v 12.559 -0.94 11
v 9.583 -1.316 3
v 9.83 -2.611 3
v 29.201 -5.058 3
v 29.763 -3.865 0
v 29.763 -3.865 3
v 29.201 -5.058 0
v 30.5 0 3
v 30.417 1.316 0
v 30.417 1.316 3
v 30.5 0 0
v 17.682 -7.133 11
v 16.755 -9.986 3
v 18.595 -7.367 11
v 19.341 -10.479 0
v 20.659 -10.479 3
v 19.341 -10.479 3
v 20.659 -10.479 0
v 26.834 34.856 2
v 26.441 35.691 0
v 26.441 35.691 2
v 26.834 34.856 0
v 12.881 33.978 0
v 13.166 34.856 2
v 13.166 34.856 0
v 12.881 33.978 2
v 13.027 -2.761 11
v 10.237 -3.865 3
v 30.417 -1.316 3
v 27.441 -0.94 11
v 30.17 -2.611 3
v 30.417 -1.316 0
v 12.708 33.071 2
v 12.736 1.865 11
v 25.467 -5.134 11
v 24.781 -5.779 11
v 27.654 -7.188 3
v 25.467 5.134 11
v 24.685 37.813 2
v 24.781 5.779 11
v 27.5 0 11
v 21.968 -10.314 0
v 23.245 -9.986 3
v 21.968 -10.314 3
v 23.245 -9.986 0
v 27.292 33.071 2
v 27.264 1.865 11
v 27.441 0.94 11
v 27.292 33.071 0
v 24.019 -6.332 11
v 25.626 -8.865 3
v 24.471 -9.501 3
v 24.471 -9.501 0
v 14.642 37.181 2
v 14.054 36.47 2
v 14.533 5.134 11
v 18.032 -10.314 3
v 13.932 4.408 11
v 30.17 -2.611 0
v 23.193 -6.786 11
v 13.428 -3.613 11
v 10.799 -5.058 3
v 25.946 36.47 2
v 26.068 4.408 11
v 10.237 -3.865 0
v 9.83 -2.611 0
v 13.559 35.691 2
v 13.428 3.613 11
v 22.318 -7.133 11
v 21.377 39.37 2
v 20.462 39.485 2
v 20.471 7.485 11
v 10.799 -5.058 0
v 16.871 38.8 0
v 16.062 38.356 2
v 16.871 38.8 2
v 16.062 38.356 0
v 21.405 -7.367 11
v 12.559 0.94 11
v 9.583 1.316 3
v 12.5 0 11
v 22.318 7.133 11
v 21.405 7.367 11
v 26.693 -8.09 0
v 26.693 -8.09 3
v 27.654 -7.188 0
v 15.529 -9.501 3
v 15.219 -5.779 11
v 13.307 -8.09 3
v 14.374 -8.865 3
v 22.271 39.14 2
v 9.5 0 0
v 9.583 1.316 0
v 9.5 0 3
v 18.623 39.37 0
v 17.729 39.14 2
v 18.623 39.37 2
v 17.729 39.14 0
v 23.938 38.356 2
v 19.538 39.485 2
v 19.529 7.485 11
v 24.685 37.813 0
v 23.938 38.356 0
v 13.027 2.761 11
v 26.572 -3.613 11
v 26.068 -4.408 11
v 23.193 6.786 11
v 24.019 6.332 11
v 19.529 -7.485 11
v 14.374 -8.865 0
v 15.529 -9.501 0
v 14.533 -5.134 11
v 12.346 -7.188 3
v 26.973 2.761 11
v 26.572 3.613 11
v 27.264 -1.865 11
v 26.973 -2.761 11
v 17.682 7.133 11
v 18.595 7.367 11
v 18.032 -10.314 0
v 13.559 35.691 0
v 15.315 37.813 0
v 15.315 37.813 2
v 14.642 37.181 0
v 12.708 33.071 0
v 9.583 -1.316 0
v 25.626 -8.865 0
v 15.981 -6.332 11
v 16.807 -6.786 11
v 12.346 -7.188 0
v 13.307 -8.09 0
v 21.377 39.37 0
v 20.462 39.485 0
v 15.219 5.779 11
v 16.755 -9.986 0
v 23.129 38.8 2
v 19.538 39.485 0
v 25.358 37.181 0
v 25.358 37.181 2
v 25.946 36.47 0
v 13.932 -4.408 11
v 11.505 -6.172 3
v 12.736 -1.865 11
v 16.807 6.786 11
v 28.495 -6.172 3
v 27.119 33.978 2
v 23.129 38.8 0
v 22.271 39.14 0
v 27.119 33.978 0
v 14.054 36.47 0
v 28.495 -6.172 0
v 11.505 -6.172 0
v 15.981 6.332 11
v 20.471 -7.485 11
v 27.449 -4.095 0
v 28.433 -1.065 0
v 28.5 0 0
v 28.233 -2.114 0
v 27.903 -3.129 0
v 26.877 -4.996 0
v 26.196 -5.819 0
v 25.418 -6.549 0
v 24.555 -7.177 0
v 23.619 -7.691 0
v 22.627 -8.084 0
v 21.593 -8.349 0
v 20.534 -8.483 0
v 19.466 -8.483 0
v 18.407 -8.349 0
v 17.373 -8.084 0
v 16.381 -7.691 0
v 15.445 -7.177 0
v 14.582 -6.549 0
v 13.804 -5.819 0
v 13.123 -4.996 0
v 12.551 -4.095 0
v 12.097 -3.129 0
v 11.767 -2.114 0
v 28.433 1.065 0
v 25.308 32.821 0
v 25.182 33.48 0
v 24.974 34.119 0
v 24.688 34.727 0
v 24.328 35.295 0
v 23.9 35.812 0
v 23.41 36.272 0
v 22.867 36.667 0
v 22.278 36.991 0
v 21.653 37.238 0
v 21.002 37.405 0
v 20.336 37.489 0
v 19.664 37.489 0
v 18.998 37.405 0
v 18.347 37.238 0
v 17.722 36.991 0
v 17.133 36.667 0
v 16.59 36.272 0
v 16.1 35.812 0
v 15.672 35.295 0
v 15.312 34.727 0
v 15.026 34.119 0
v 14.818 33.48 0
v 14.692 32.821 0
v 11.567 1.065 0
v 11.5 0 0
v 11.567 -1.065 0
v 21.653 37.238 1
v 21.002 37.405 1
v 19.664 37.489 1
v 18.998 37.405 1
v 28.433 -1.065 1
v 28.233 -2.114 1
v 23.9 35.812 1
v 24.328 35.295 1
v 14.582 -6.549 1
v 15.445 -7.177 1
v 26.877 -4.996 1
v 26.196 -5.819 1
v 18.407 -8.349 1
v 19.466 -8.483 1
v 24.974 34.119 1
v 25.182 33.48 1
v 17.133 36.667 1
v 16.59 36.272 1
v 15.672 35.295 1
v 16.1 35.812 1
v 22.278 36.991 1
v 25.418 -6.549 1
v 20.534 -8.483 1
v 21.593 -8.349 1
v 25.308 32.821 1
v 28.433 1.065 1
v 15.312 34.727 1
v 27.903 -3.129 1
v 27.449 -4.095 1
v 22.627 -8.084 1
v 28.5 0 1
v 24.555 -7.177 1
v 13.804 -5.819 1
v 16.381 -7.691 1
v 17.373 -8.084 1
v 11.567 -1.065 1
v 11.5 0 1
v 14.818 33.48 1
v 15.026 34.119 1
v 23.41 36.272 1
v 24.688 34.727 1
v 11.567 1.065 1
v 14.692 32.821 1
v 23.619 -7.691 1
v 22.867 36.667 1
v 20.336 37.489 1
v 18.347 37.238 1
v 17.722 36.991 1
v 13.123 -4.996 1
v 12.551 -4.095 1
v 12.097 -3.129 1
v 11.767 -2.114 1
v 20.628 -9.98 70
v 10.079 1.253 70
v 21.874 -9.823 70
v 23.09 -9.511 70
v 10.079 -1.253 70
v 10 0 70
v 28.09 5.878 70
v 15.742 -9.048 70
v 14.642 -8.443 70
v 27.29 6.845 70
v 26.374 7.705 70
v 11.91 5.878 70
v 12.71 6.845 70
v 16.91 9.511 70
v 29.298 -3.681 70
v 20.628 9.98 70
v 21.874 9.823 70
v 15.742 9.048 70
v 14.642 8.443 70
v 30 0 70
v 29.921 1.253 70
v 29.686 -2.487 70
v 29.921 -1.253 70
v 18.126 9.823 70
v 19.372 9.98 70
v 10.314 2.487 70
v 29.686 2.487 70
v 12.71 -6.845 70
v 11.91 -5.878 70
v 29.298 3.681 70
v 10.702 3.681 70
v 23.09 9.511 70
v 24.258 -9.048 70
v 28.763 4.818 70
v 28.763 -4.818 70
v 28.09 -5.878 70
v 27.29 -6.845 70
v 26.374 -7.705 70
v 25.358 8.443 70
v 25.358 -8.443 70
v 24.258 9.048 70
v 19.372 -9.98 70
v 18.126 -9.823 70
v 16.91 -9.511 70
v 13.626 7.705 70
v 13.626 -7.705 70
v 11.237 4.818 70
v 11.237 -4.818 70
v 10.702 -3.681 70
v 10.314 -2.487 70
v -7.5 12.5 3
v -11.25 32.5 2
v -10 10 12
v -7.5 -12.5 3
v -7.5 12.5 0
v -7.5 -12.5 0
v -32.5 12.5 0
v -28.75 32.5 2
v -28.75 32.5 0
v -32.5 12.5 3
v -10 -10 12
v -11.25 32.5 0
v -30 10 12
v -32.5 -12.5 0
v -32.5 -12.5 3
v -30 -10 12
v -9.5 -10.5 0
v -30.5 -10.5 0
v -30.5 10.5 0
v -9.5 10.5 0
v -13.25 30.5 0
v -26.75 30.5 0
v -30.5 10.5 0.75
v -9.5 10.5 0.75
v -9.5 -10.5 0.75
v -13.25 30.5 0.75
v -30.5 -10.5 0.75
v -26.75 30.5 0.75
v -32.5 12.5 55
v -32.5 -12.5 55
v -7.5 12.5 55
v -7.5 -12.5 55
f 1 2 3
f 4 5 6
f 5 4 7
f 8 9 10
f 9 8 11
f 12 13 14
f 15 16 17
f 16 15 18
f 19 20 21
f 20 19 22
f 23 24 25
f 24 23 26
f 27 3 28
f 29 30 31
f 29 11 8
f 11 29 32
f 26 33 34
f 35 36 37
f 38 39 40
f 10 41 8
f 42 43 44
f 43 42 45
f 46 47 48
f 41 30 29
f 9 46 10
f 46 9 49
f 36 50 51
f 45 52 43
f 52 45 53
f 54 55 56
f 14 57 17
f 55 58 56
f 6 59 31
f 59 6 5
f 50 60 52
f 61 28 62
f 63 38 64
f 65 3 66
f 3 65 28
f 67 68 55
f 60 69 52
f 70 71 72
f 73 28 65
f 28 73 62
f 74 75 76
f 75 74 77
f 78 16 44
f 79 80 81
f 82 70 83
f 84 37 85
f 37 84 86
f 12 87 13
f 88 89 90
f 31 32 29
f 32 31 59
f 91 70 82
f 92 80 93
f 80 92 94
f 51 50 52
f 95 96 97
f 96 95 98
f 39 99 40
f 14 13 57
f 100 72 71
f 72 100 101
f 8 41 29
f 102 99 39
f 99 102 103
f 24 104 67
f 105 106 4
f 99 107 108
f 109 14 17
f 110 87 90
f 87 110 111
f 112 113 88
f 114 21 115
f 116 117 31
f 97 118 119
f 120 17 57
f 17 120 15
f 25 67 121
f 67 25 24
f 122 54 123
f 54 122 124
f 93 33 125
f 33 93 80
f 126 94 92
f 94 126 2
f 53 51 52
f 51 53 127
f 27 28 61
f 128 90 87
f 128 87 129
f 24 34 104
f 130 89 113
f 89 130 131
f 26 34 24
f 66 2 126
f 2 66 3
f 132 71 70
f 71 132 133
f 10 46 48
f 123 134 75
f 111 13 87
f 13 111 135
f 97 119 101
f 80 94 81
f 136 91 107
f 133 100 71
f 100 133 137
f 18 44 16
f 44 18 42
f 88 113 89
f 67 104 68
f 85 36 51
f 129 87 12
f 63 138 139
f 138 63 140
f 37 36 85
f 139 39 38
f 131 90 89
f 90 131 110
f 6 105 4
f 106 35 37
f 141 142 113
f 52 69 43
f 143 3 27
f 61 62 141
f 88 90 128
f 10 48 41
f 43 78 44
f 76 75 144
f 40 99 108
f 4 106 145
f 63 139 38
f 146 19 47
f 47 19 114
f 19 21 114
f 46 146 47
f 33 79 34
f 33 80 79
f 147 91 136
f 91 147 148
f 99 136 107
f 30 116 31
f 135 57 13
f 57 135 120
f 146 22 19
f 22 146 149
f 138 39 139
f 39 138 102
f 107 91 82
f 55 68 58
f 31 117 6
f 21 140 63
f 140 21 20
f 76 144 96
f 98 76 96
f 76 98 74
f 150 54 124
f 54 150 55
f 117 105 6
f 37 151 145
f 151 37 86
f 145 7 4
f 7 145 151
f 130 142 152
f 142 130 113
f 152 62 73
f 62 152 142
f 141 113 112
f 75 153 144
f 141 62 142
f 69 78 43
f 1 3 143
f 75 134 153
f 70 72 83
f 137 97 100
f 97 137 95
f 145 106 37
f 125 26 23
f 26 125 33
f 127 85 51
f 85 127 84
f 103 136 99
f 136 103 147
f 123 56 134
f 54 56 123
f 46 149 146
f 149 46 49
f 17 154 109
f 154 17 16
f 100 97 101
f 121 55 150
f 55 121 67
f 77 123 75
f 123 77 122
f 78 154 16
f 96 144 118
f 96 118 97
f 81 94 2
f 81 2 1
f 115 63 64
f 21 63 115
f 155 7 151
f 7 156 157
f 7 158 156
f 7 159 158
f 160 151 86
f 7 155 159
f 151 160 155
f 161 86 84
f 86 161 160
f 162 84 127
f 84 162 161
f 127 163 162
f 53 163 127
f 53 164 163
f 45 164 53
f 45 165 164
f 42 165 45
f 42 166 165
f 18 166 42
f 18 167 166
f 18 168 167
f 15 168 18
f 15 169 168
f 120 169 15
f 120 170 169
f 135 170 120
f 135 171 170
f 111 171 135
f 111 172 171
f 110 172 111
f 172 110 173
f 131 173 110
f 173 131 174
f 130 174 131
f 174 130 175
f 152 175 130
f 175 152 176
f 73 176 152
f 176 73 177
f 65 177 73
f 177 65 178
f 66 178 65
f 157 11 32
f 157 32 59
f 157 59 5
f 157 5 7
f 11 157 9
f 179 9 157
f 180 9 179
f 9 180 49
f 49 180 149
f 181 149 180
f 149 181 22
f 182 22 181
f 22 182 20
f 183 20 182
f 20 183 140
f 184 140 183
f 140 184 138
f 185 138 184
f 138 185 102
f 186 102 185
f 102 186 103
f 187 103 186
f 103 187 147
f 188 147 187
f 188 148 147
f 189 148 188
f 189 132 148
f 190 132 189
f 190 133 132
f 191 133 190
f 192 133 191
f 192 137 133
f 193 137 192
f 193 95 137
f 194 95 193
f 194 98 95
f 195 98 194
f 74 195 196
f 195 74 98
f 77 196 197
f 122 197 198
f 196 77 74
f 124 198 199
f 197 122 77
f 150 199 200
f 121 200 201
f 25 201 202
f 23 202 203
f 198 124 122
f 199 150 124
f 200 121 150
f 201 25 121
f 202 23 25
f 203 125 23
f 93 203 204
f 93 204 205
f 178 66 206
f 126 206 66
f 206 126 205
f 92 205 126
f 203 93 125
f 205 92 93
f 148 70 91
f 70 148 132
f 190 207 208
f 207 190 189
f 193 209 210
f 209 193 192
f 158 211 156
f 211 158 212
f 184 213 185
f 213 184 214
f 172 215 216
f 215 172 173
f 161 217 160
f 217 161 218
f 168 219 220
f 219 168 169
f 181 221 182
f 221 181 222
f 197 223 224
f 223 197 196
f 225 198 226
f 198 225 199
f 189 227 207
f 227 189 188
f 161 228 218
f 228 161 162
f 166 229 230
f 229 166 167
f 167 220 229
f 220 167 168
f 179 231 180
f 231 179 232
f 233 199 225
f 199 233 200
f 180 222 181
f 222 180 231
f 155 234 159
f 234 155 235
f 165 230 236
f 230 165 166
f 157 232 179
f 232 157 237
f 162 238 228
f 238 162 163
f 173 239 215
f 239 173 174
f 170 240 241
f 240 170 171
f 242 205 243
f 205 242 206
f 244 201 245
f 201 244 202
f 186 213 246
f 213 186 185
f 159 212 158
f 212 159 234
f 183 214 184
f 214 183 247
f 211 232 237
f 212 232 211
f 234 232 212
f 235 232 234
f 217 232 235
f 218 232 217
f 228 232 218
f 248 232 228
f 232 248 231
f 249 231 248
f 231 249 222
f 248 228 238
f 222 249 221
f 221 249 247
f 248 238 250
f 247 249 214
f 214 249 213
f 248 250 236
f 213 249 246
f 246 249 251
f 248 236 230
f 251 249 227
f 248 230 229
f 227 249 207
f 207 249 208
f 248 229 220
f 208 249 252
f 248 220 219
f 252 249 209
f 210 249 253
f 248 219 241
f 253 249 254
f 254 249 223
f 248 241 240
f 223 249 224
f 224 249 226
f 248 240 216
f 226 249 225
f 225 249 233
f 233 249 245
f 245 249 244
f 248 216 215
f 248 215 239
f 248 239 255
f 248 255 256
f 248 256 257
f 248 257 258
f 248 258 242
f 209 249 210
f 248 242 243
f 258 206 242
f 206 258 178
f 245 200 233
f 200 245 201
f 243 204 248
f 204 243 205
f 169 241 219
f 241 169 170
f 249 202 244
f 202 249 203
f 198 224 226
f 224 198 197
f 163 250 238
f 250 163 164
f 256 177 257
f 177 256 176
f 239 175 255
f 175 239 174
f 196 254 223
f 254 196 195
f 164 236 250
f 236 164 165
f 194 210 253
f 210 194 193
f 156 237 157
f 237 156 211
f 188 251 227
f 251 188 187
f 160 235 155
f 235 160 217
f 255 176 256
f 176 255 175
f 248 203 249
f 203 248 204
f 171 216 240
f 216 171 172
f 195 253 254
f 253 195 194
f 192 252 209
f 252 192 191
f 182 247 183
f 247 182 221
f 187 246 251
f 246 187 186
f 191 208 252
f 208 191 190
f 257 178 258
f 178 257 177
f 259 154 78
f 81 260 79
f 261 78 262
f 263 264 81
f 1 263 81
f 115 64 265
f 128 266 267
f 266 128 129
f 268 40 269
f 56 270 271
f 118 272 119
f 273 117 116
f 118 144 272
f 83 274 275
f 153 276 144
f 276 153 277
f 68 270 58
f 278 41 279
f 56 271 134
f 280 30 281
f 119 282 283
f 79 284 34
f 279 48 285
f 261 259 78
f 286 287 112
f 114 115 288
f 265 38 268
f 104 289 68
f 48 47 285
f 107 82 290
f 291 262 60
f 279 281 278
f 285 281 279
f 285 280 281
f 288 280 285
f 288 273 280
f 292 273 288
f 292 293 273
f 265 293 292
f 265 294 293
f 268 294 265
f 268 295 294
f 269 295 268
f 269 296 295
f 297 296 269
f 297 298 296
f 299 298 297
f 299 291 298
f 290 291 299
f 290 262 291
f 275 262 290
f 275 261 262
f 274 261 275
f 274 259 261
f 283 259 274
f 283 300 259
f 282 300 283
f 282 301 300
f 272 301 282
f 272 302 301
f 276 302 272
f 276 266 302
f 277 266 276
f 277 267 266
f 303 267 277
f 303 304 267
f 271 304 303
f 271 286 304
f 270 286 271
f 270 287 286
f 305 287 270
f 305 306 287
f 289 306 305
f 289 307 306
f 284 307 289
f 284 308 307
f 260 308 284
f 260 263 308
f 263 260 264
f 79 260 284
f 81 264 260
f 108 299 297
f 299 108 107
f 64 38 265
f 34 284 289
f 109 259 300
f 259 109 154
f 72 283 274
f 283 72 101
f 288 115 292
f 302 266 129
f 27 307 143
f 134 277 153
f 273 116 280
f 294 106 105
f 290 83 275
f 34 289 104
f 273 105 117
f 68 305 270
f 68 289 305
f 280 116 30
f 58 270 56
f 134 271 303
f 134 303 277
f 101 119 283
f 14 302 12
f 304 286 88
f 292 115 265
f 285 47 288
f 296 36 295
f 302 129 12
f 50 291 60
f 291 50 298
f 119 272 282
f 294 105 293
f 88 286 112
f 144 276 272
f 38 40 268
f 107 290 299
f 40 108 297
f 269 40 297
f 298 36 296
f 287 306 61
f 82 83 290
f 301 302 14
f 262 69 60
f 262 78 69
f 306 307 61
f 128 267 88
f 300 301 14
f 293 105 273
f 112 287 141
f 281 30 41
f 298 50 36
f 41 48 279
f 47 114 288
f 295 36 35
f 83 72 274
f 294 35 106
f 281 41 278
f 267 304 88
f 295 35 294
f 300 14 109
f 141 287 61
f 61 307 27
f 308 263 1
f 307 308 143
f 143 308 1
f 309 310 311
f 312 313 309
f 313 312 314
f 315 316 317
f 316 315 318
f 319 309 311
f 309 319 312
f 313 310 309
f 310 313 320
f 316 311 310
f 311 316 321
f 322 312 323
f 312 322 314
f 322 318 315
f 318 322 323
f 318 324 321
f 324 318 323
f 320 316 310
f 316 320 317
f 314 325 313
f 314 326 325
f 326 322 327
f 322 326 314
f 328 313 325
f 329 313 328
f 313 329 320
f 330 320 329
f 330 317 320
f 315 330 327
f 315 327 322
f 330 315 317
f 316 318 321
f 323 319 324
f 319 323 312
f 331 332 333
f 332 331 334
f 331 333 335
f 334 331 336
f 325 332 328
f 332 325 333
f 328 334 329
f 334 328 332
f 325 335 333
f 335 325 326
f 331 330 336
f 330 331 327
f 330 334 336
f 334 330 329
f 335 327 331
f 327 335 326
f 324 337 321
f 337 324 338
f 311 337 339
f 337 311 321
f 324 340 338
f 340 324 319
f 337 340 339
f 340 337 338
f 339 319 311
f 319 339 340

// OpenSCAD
// file: ../utilities/transformations_oblomobka.scad
// Transformations
// (C) @oblomobka - 2014
// GPL3

// Transforma una forma en un sector según un ángulo dado.

module sector(	angle, 	// es el ángulo del sector, lo que quedará de la forma original
				d,		// valor auxiliar, será como mínimo igual al diámetro del cilindro que envuelve la forma original
				h		// valor auxiliar, será como mínimo igual a la altura del cilindro que envuelve la forma original
				){

POINTS=[	[0,0,-h],
		[0,0,h],
		[d*cos(0*angle/4),d*sin(0*angle/4),-h],
		[d*cos(0*angle/4),d*sin(0*angle/4),h],
		[d*cos(1*angle/4),d*sin(1*angle/4),-h],
		[d*cos(1*angle/4),d*sin(1*angle/4),h],
		[d*cos(2*angle/4),d*sin(2*angle/4),-h],
		[d*cos(2*angle/4),d*sin(2*angle/4),h],
		[d*cos(3*angle/4),d*sin(3*angle/4),-h],
		[d*cos(3*angle/4),d*sin(3*angle/4),h],
		[d*cos(4*angle/4),d*sin(4*angle/4),-h],
		[d*cos(4*angle/4),d*sin(4*angle/4),h],
		];

TRIANGLES=[	[0,1,2],
			[1,3,2],
			[2,3,4],
			[3,5,4],
			[4,5,6],
			[5,7,6],
			[6,7,8],
			[7,9,8],
			[8,9,10],
			[9,11,10],
			[10,11,0],
			[11,1,0],

			[5,3,1],
			[7,5,1],
			[9,7,1],
			[11,9,1],
			[0,2,4],
			[0,4,6],
			[0,6,8],
			[0,8,10]
			];

if(angle<=0 || angle>=360){
	child();
	}
	else{
		intersection(){
			polyhedron(points=POINTS,triangles=TRIANGLES);
			child();
			}
		}
}

//sector (150,40,10)cylinder(r=20,h=10); // Ejemplo de uso de la tansformación sector()
// file: ../utilities/functions_ext.scad
// Funciones sacadas de otras librerías y de diferentes autores

include <constants_oblomobka.scad>

/* A circular helix of radius a and pitch 2πb is described by the following parametrisation:
x(t) = a*cos(t),
y(t) = a*sin(t),
z(t) = b*t
Licensed under the MIT license.
© 2010 by Elmo Mäntynen
*/
function b(pitch) = pitch/(TAU);
function t(pitch, z) = z/b(pitch);
function helix_curve(pitch, radius, z) = [radius*cos(deg(t(pitch, z))), radius*sin(deg(t(pitch, z))), z];


/* Utility functions.
 * Originally by Hans Häggström, 2010.
 * Dual licenced under Creative Commons Attribution-Share Alike 3.0 and LGPL2 or later
 */
function distance(a, b) = sqrt( (a[0] - b[0])*(a[0] - b[0]) +
                                (a[1] - b[1])*(a[1] - b[1]) +
                                (a[2] - b[2])*(a[2] - b[2]) );

function length2(a) = sqrt( a[0]*a[0] + a[1]*a[1] );

function normalized(a) = a / (max(distance([0,0,0], a), 0.00001));

function normalized_axis(a) = 	a == "x" ? [1, 0, 0]:
                  			 	a == "y" ? [0, 1, 0]:
                   				a == "z" ? [0, 0, 1]: normalized(a);

function angleOfNormalizedVector(n) = [0, -atan2(n[2], length2([n[0], n[1]])), atan2(n[1], n[0]) ];

function angle(v) = angleOfNormalizedVector(normalized(v));

function angleBetweenTwoPoints(a, b) = angle(normalized(b-a));
// file: ../utilities/constants_oblomobka.scad
// números transcendentes

TAU = 2*PI; //6.2831853071 (PI ya está definido en Openscad)
EULER=2.71828282;


// números algebraicos

PHI=(1+sqrt(5))/2;


// Vectores

X = [1, 0, 0];
Y = [0, 1, 0];
Z = [0, 0, 1];
// file: hip.scad
//////////////////////////////////////////////////////////////////////////////////////////////////
// HIP[OBLOBOTS] 
// preform
//////////////////////////////////////////////////////////////////////////////////////////////////
// (c) Jorge Medal (@oblomobka) - Sara Alvarellos (@trecedejunio) 2014-04 v.10
//////////////////////////////////////////////////////////////////////////////////////////////////
// GPL license
//////////////////////////////////////////////////////////////////////////////////////////////////

include <../utilities/external_elements_oblobots.scad>
include <../utilities/presets_oblobots.scad>
include <../utilities/limits_oblobots.scad>

use <../utilities/functions_oblomobka.scad>
use <../utilities/shapes_oblomobka.scad>


//////////////////////////////////////////////////////////////////
/////////////////// MODULO hip_cylindrical  //////////////////////

module hip_cylindrical(hip=[40,15,80]){	// [ d,h,f ] Medidas de la cadera

// valores con límites: acotados entre un máximo y un mínimo (los valores límite están en <limits_oblobots.scad>)
d_hip=lim(d_hip_minmax[0],hip[0],d_hip_minmax[1]);
h_hip=lim(h_hip_minmax[0],hip[1],h_hip_minmax[1]);
f_hip=lim(f_hip_minmax[0],hip[2],f_hip_minmax[1]);

// variables condicionadas a los valores de entrada
h1_hip=h_hip-f_hip*h_hip/110;
h2_hip=h_hip-h1_hip;

d1_hip=max(3*d_hip/4,(d_hip-2*h1_hip));  // diámetro inferior de la cadera

$fn=50;

// --------- Volumen ----------------

union(){
	cylinder(r1=d1_hip/2,r2=d_hip/2,h=h1_hip);
	translate([0,0,h1_hip])
		cylinder (r=d_hip/2,h=h2_hip);	
	}
}
// -------------- Fin del módulo hip_cylindrical() ------------------------
// ------------------------------------------------------------------------


//////////////////////////////////////////////////////////////////
/////////////////// MÓDULO hip_quadrangle()  /////////////////////

module hip_quadrangle (hip=[40,22,18,3]){			// [ ancho(x), fondo(y), altura(z), chaflán ] Medida de la cadera


x_hip=lim(x_hip_minmax[0],hip[0],x_hip_minmax[1]);			// medida de la cadera: ancho
y_hip=lim(y_hip_minmax[0],hip[1],y_hip_minmax[1]);			// medida de la cadera: fondo
z_hip=lim(z_hip_minmax[0],hip[2],z_hip_minmax[1]);			// medida de la cadera: alto
bevel_hip=lim(bevel_hip_minmax[0],hip[3],bevel_hip_minmax[1]);;		// medida de la cadera: chaflán

// Volumen
difference(){
	translate([0,0,z_hip/2])
		cube ([x_hip,y_hip,z_hip],center=true);
	for(i=[	[1,1,0],
			[1,-1,-90],
			[-1,1,90],
			[-1,-1,180]]){
		translate([i[0]*x_hip,i[1]*y_hip,0]/2)
			rotate([0,0,i[2]])rotate(45*[0,1,1])
				cube([min(2*bevel_hip,((y_hip-1)/2)),x_hip,x_hip],center=true);
		}
	}
}
// ------------ Fin del módulo hip_quadrangle(hip[x,y,z,b]) -------------
// ----------------------------------------------------------------------


/////////////////////////////////////////////////////////////////////////
/////////////////// Ejemplos de aplicación //////////////////////////////

i=35;

translate([i,0,0])
	hip_cylindrical(hip=[60,21,90]);

translate([-i,0,0])
	hip_quadrangle(hip=[50,25,25,4]);
// file: ../utilities/shapes_oblomobka.scad
// Shapes
// (C) @oblomobka - 2014
// GPL3

include <constants_oblomobka.scad>
include <functions_oblomobka.scad>
include <functions_ext.scad>

use <transformations_oblomobka.scad>

// --- Piramide con base circunscrita en un círculo definido en las variables
module pyramid_circumscribed (	n=4,			// nº lados de la base de la pirámide	
								d1=20,		// diámetro del círculo-base donde se circunscribe la pirámide
								d2=0,		// diámetro del círculo-punta donde se circunscribe la pirámide
								h=10			// altura de la pirámide
								){

if(n%2==0){
	rotate([0,0,180/n])
		cylinder (r1=d1/2/cos(180/n), r2=d2/2/cos(180/n), h=h, $fn=n);
	}
	else{
		rotate([0,0,90/n])
			cylinder (r1=d1/2/cos(180/n), r2=d2/2/cos(180/n), h=h, $fn=n);
		}

}
// ------- pyramid_circumscribed (n=n,d1=d1,d2=d2,h=h); -----------------

// --- Prisma con base circunscrita en un círculo definido en las variables
module prism_circumscribed (	n=4,			// nº lados de la base del prisma
							d=20,		// diámetro del círculo donde se circunscribe el prisma
							h=10			// altura del prisma
							){
if(n%2==0){
	rotate([0,0,180/n])
		cylinder (r=d/2/cos(180/n), h=h, $fn=n);
	}
	else{
		rotate([0,0,90/n])
			cylinder (r=d/2/cos(180/n), h=h, $fn=n);
		}
}
// ------- prism_circumscribed (n=n,d=d,h=h); -----------------



// Toros

// Definido por el diámetro exterior y el diámetro del círculo en revolución
module torusOD (d1,d2,resolution){
$fn=resolution;	
rotate_extrude(){
	translate([d1/2-d2/2,0,0])
		circle(r=d2/2);
	}
}

// Definido por el diámetro exterior y el diámetro interior
module torusOI (d1,d2,resolution){
$fn=resolution;	
d=(d1-d2)/2;
rotate_extrude(){
	translate([d1/2-d/2,0,0])
		circle(r=d/2);
	}
}

// Definido por el diámetro de la línea neutra y el diámetro del círculo en revolución
module torusND (d1,d2,resolution){
$fn=resolution;	
rotate_extrude(){
	translate([d1/2,0,0])
		circle(r=d2/2);
	}
}

module torus_sector(d1,d2,angle=360,mode=1,extreme=true,resolution=32){

if(angle<=0 || angle>=360){
	if(mode==1){torusOD(d1,d2,resolution=resolution);}
	else{if(mode==2){torusND(d1,d2,resolution=resolution);}
	else{if(mode==3){torusOI(d1,d2,resolution=resolution);}}}
	}

else{
	if(mode==1){
		union(){
			sector(angle,d1,d2/2)torusOD(d1,d2,resolution=resolution);
			if(extreme==true){
				translate([d1/2-d2/2,0,0])sphere(d2/2,$fn=resolution);
				translate([(d1/2-d2/2)*cos(angle),(d1/2-d2/2)*sin(angle),0])sphere(d2/2,$fn=resolution);
				}
			}
		}
	else{
		if(mode==2){
			union(){
				sector(angle,d1+d2,d2/2)torusND(d1,d2,resolution=resolution);
				if(extreme==true){
					translate([d1/2,0,0])sphere(d2/2,$fn=resolution);
					translate([d1/2*cos(angle),d1/2*sin(angle),0])sphere(d2/2,$fn=resolution);
					}
				}
			}
		else{
			if(mode==3){
				union(){
					sector(angle,d1,(d1-d2)/4)torusOI(d1,d2,resolution=resolution);
					if(extreme==true){
						translate([d1/2-(d1-d2)/4,0,0])sphere((d1-d2)/4,$fn=resolution);
						translate([(d1/2-(d1-d2)/4)*cos(angle),(d1/2-(d1-d2)/4)*sin(angle),0])sphere((d1-d2)/4,$fn=resolution);
						}
					}
				}
			}
		}
	}
}


// Tubos

module tubeOT (d,t,h,resolution=resolution){	
	difference(){
		cylinder(r=d/2,h=h,$fn=resolution);
		cylinder(r=(d-2*t)/2,h=3*h,center=true,$fn=resolution);
		}
}

// Definido por el diámetro exterior y el diámetro interior
module tubeOI (d1,d2,h,resolution=resolution){
	difference(){
		cylinder(r=d1/2,h=h,$fn=resolution);
		cylinder(r=d2/2,h=3*h,center=true,$fn=resolution);	
		}
}

// Definido por el diámetro de la línea neutra y el diámetro del círculo en revolución
module tubeNT (d,t,h,resolution=resolution){
	difference(){
		cylinder(r=(d+t)/2,h=h,$fn=resolution);
		cylinder(r=(d-t)/2,h=3*h,center=true,$fn=resolution);
	}
}

module tube_sector(d=25,t=2,h=1,angle=360,mode=1,extreme=true,resolution=32){

if(angle<=0 || angle>=360){
	if(mode==1){tubeOT(d,t,h,resolution=resolution);}
	else{if(mode==2){tubeNT(d,t,h,resolution=resolution);}
	else{if(mode==3){tubeOI(d,t,h,resolution=resolution);}}}
	}

else{
	if(mode==1){
		union(){
			sector(angle,d,h)tubeOT(d,t,h,resolution=resolution);
			if(extreme==true){
				translate([d/2-t/2,0,0])cylinder(r=t/2,h=h,$fn=resolution);
				translate([(d/2-t/2)*cos(angle),(d/2-t/2)*sin(angle),0])cylinder(r=t/2,h=h,$fn=resolution);;
				}
			}
		}
	else{
		if(mode==2){
			union(){
				sector(angle,d+t,h)tubeNT(d,t,h,resolution=resolution);
				if(extreme==true){
					translate([d/2,0,0])cylinder(r=t/2,h=h,$fn=resolution);
					translate([d/2*cos(angle),d/2*sin(angle),0])cylinder(r=t/2,h=h,$fn=resolution);
					}
				}
			}
		else{
			if(mode==3){
				union(){
					sector(angle,d,h)tubeOI(d,t,h,resolution=resolution);
					if(extreme==true){
						translate([d/2-(d-t)/4,0,0])cylinder(r=(d-t)/4,h=h,$fn=resolution);
						translate([(d/2-(d-t)/4)*cos(angle),(d/2-(d-t)/4)*sin(angle),0])cylinder(r=(d-t)/4,h=h,$fn=resolution);
						}
					}
				}
			}
		}
	}
}

//torus_sector(d1=15,d2=4,angle=215,mode=3,extreme=true,resolution=50);
//tube_sector(d=24,t=11,h=15,angle=250,mode=1,extreme=true,resolution=50);

pyramid_circumscribed(n=10,d=8,h=4);
// file: ../utilities/functions_oblomobka.scad
// Functions
// (C) @oblomobka - 2014
// GPL3

include <constants_oblomobka.scad>

// da el diámetro interior del cono(d1,d2,h) a una altura interior(hi) conocida
function di_cone(d1,d2,h,hi)=d2+(d1-d2)*(1-hi/h);

// da la altura interior del cono(d1,d2,h) a un diametro(di) conocido
function hi_cone(d1,d2,h,di)=-h*((di-d2)/(d1-d2)-1);

// 
function r_circle_intersection (d1,d2)=sqrt(pow(d1/2,2)-pow(d2/2,2));

// Relaciones entre radio, apotema y lado en un polígono de n lados
function side_apothem (apothem,n)=apothem*2*tan(180/n);
function apothem_radius(radius,n)=radius*cos(180/n);
function radius_apothem(apothem,n)=apothem/cos(180/n);
function side_radius (radius,n)=radius*2*sin(180/n);

// limita los posibles valores de x, que siempre estarán comprendidos entre un minimo(a) y un maximo(z)
function lim(a,x,z)=max(a,min(x,z));

// transforma angulo, radianes --> hexadecimal
function deg(angle) = 180*angle/PI;
// transforma angulo, hexadecimal --> radianes
function rad(angle) = angle*PI/180;
// file: ../utilities/limits_oblobots.scad
//PIN
	d_pin_minmax=[10,30];			//	d_pin=lim(d_pin_minmax[0],pin[0],d_pin_minmax[1]);			
	h_pin_minmax=[0,10];			//	h_pin=lim(h_pin_minmax[0],pin[1],h_pin_minmax[1]);

//LEGS & FOOTS
	d_leg_minmax=[10,30];			//	d_leg=lim(d_leg_minmax[0],leg[0],d_leg_minmax[1]);
	h_leg_minmax=[20,90];			//	h_leg=lim(h_leg_minmax[0],leg[1],h_leg_minmax[1]);	
	n_leg_minmax=[4,16];			//	n_leg=lim(n_leg_minmax[0],leg[2],n_leg_minmax[1]);
	legsposition_minmax=[0,100];	// 	legsposition=lim(legsposition_minmax[0],leg[1],legsposition_minmax[1]);

	l_foot_minmax=[24,70];		//	l_foot=lim(l_foot_minmax[0],foot[0],l_foot_minmax[1]);
	h_foot_minmax=[0,40];			//	h_foot=lim(h_foot_minmax[0],foot[1],h_foot_minmax[1]);

//HIP | WAIST
	//C
	d_hip_minmax=[25,80];			//	d_hip=lim(d_hip_minmax[0],hip[0],d_hip_minmax[1]);
	h_hip_minmax=[10,70];			//	h_hip=lim(h_pin+2,hip[1],h_hip_minmax[1]);
	f_hip_minmax=[0,100];			//	f_hip=lim(f_hip_minmax[0],hip[2],f_hip_minmax[1]);

								//	d1_waist=lim(d_pin,waist[0],d_hip);
								//	d2_waist=lim(d_pin,waist[1],d1_waist);
	h_waist_minmax=[0.3,20];		//	h_waist=lim(h_waist_minmax[0],waist[2],h_waist_minmax[1]);

	
	//Q
	x_hip_minmax=[20,90];			//	x_hip=lim(x_hip_minmax[0],hip[0],x_hip_minmax[1]);
	y_hip_minmax=[20,60];			//	y_hip=lim(y_hip_minmax[0],hip[1],y_hip_minmax[1]);
	z_hip_minmax=[10,60];			//	z_hip=lim(z_hip_minmax[0],hip[2],z_hip_minmax[1]);
	bevel_hip_minmax=[0.5,20];	//	bevel_hip=lim(bevel_hip_minmax[0],hip[3],bevel_hip_minmax[1]);

	n_waist_minmax=[4,50];		//	n_waist=lim(n_waist_minmax[0],waist[3],n_waist_minmax[1]);
								//	d1_waist=lim(d_pin,waist[0],min(x_hip,y_hip));
								//	d2_waist=lim(d_pin,waist[1],d1_waist);


//TRUNK | SHOULDER | NECK
	//C
	d1_trunk_minmax=[30,100];		//	d1_trunk=lim(d1_trunk_minmax[0],trunk[0],d1_trunk_minmax[1]); 
	d2_trunk_minmax=[30,100];		//	d2_trunk=lim(d2_trunk_minmax[0],trunk[1],d1_trunk);
	h_trunk_minmax=[24,100];		//	h_trunk=lim(h_trunk_minmax[0],trunk[2],h_trunk_minmax[1]);

	d1_shoulder_minmax=[12,50];	//	d1_shoulder=lim(d1_shoulder_minmax[0],shoulder[0],h_trunk*sin(angle_trunk));
	d_aux_shoulder_minmax=[0,10];	//	d_aux_shoulder=lim(d_aux_shoulder_minmax[0],shoulder[1],d_aux_shoulder_minmax[1]);
	h_shoulder_minmax=[0,50];		//	h_shoulder=lim(h_shoulder_minmax[0],shoulder[2],d2_trunk/2);

								//	d1_neck=lim(d_pin+2,neck[0],d2_trunk);
								//	d2_neck=lim(d_pin+2,neck[1],d1_neck);
	h_neck_minmax=[0.3,20];		//	h_neck=lim(h_neck_minmax[0],neck[2],h_neck_minmax[1]);

	//Q
	x_trunk_minmax=[20,90];		//	x_trunk=lim(x_trunk_minmax[0],trunk[0],x_trunk_minmax[1]);
	y_trunk_minmax=[20,90];		//	y_trunk=lim(d_pin+1+x_trunk/5,trunk[1],y_trunk_minmax[1]);
	z_trunk_minmax=[26,90];		//	z_trunk=lim(z_trunk_minmax[0],trunk[2],z_trunk_minmax[1]);
	
	n_neck_minmax=[4,50];			//	n_neck=lim(n_neck_minmax[0],neck[3],n_neck_minmax[1]);
								//	d1_neck=lim(d_pin+2,neck[0],min(x_trunk,y_trunk));	
								//	d2_neck=lim(d_pin+2,neck[1],d1_neck);

	//ELECTRIC TRUNK
	d_polygonal_trunk_minmax=[45,80];	//d_polygonal_trunk=lim(d_polygonal_trunk_minmax[0],trunk[0],d_polygonal_trunk_minmax[1]);							
	h_polygonal_trunk_minmax=[87,120];	//h_polygonal_trunk=lim(h_polygonal_trunk_minmax[0],trunk[1],h_polygonal_trunk_minmax[1]);
	thickness_trunk_minmax=[1,6];	//thickness_trunk=lim(thickness_trunk_minmax[0],trunk[2],thickness_trunk_minmax[1]);

// ARMS | HANDS
	// C
	d_arm_minmax=[10,40];			// 	d_arm=lim(d_arm_minmax[0],arm[0],d_arm_minmax[1]);
								//	d_arm=lim(d_pin+1,arm[0],d_arm_minmax[1]);	
	h_arm_minmax=[5,25];			// 	h_arm=lim(h_arm_minmax[0],arm[1],h_arm_minmax[1]);
	armpit_minmax=[0.3,60];		//	armpit=lim(armpit_minmax[0],arm[2],armpit_minmax[1]);
	l_arm_minmax=[20,120];		// 	l_arm=lim(d_arm+d_hand,arm[2],l_arm_minmax[1]);	

	d_hand_minmax=[10,60];		//	d_hand=lim(d_hand_minmax[0],hand[0],d_hand_minmax[1]);
	h_hand_minmax=[3,25];			//	h_hand=lim(h_hand_minmax[0],hand[1],h_arm-0.5);
	angle_hand_minmax=[0,180];	//	angle_hand=lim(angle_hand_minmax[0],hand[2]/2,angle_hand_minmax[1]);

	// Q
	x_arm_minmax=[5,25];			// 	x_arm=lim(x_arm_minmax[0],arm[1],x_arm_minmax[1]);
	y_arm_minmax=[10,40];			// 	y_arm=lim(y_arm_minmax[0],arm[0],y_arm_minmax[1]);
	z_arm_minmax=[20,120];		//	z_arm=lim(y_arm+5+d_hand,arm[2],z_arm_minmax[1]);

	n_hand_minmax=[4,12];			// 	n_hand=lim(n_hand_minmax[0],2*floor(hand[2]/2),n_hand_minmax[1]);
								//	h_hand=lim(h_hand_minmax[0],hand[1],x_arm-0.5);

// HEAD | EYES | BRAIN
	// C
	h_head_minmax=[20,100];		// 	h_head=lim(h_head_minmax[0],head[2],h_head_minmax[1]);
	d1_head_minmax=[20,60];		// 	d1_head=lim(h_head_minmax[0],head[0],h_head_minmax[1]);
	d2_head_minmax=[15,150];		// 	d2_head=lim(h_head_minmax[0],head[1],2*h_head+d1_head);

	// Q
	x_head_minmax=[20,100];		// x_head=lim(x_head_minmax[0],head[0],x_head_minmax[1]);
	y_head_minmax=[20,100];		// y_head=lim(y_head_minmax[0],head[1],y_head_minmax[1]);
	z_head_minmax=[20,100];		// z_head=lim(z_head_minmax[0],head[2],z_head_minmax[1]);

	d_eye_minmax=[5,40];			// 	d_eye=lim(d_eye_minmax[0],eye[0],(d1_head+d2_head)/2);
	h_eye_minmax=[1,10];			// 	h_eye=lim(h_eye_minmax[0],eye[1],h_eye_minmax[1]);
	edge_eye_minmax=[1,12];		//	edge_eye=lim(edge_eye_minmax[0],eye[2],d_eye/2-3);

	frown_eye_expression_minmax=[0,100];		// frown_eye_expression=lim(frown_eye_expression_minmax[0],eye_expression[1],frown_eye_expression_minmax[1]);
	bridge_eye_position_minmax=[0,100];		// bridge_eye_position=lim(bridge_eye_position_minmax[0],eye_position[0],bridge_eye_position_minmax[1]);	
	f_h_eye_position_minmax=[0,100];			// f_h_eye_position=lim(f_h_eye_position_minmax[0],eye_position[1],f_h_eye_position_minmax[1]);	

	h_brain_minmax=[0,40];			//	h_brain=lim(h_brain_minmax[0],brain[0],h_brain_minmax[1]);
	edge_brain_minmax=[0,25];			//	edge_brain=lim(edge_brain_minmax[0],brain[1],edge_brain_minmax[1]);

//BADGE
	d_badge_minmax=[20,40];		//	d_badge=lim(d_badge_minmax[0],badge[0],d_badge_minmax[1])
	h_badge_minmax=[0.5,5];		// 	h_badge=lim(h_badge_minmax[0],badge[1],h_badge_minmax[1]);
	n_badge_minmax=[4,50];		// 	n_badge=lim(n_badge_minmax[0],badge[3],n_badge_minmax[1]);
	edge_badge_minmax=[1,5];		//	edge_badge=lim(edge_badge_minmax[0],badge[2],edge_badge_minmax[1]);
// file: ../utilities/presets_oblobots.scad
//////////////////////////////////////////////////////////////////////////////////////////////////
// presets [OBLOBOTS] 
// valores predeterminados para los volúmenes de un oblobot así como de los modos de represntación
//////////////////////////////////////////////////////////////////////////////////////////////////
// (c) Jorge Medal (@oblomobka) - Sara Alvarellos (@trecedejunio) Oct 2013
//////////////////////////////////////////////////////////////////////////////////////////////////
// GPL license
//////////////////////////////////////////////////////////////////////////////////////////////////

use <functions_oblomobka.scad>


//-- CARACTERÍSTICAS DEL PIN

SIMPLE=[0,0,0];					// cilindro 

	// Pestañas en pin con punta expandible
	tab_expansion=80;
	TABWIDE=[35,35,tab_expansion];
	TABNORMAL=[50,50,tab_expansion];
	TABFINE=[65,65,tab_expansion];

/////////////////////////////////////////////
/////// REPRESENTACIÓN //////////////////////
/////////////////////////////////////////////

//-- MODOS DE REPRESENTACIÓN DE LAS PARTES 

ASSEMBLED=[0,1,0,0];
EXPLOSION=[0,1,1,1];
PRINTING=[1,0,0,2];


//-- ELECCIÓN DE LA PARTE REPRESENTADA	

ALL=[0];
LEGS=[1];
HIP=[2];
TRUNK=[3];
HEAD=[4];
ARMS=[5];
BADGES=[6];

//-- COLORES

arms_color=[1,rands(100,200,1)[0]/255,0];
legs_color=[0,rands(100,200,1)[0]/255,1];
trunk_color=[rands(0,100,1)[0]/255,rands(150,225,1)[0]/255,rands(0,100,1)[0]/255];
head_color=[220/255,rands(0,100,1)[0]/255,20/255];
badges_color=[rands(0,255,1)[0]/255,rands(0,255,1)[0]/255,rands(0,255,1)[0]/255];
hip_color=[0,(rands(100,200,1)[0])/255,1];
// file: ../utilities/external_elements_oblobots.scad
//////////////////////////////////////////////////////////////////////////////////////////////////
// external elements [OBLOBOTS] 
// librería de elementos externos comerciales (botones automáticos, espigas de madera baterías, ...) 
// que se usan en las partes de los oblobots
//////////////////////////////////////////////////////////////////////////////////////////////////
// (c) Jorge Medal (@oblomobka) - Sara Alvarellos (@trecedejunio) 2014-02
//////////////////////////////////////////////////////////////////////////////////////////////////
// GPL license
//////////////////////////////////////////////////////////////////////////////////////////////////

//-- BOTONES AUTOMÁTICOS - Press Fastener (PF)
//-- Cada código corresponde a las medidas de un modelo concreto

//XXX= [ xx,xx,xx,xx,xx,xx,xx ];		// [ 	diametro hembra,
									//		espesor hembra,
									//		diámetro alojamiento en hembra (aparece en los botones para coser),
									//		saliente del alojamiento en hembra (aparece en los botones para coser),
									//		diámetro macho,
									//		espesor macho	
									//		tipo]

NULL=[0,0,0,0,0,0,0];				// no hay botón automático 
//PON = [11.7,2.35,0,0,11.7,1.6 ];	// marca desconocida, encontrado en Pontejos (Madrid)
//PRYM10 = [11,2.2,0,0,11,2.0];		// marca PRYM - 10 mm
PRYM_SNAP_FASTENERS_11 = [10.1,1.4,3.5,3,9.1,1,2];	// marca PRYM - Snap fasteners 11mm
PRYM_SNAP_FASTENERS_9 = [8.5,1.5,3,2.7,8.1,1,2];	// marca PRYM - Snap fasteners 9mm

fit_male=0.7;

//-- Espigas de madera - DOWEL

DOWEL_8=[8,40,0,0,0,0,1];
DOWEL_6=[6,30,0,0,0,0,1];

//-- TUBOS DE PLÁSTICO

PIPE_6=[6,20,0,0,0,0,1];



//-- BATERÍAS CILÍNDRICAS

//XX= [ xx,xx ];		// [ 	diametro de la pila,
					//		longitud	de la pila	]

AA = [ 14.5, 50.5 ];
AAA = [ 10.5,44.5 ];
C = [ 26.2, 50 ];
D = [ 34.2, 61.5 ]; 
// main file
//////////////////////////////////////////////////////////////////////////////////////////////////
// Leg[OBLOBOTS] 
// preform
//////////////////////////////////////////////////////////////////////////////////////////////////
// (c) Jorge Medal (@oblomobka) - Sara Alvarellos (@trecedejunio) 2014-04 v.10
//////////////////////////////////////////////////////////////////////////////////////////////////
// GPL license
//////////////////////////////////////////////////////////////////////////////////////////////////

include <../utilities/external_elements_oblobots.scad>
include <../utilities/presets_oblobots.scad>
include <../utilities/limits_oblobots.scad>

use <../utilities/functions_oblomobka.scad>
use <../utilities/shapes_oblomobka.scad>

use <hip.scad>


/////////////////////////////////////////////////////////////////
/////////////////// MÓDULO leg_cylindrical()  ///////////////////

module leg_cylindrical (	leg=[12,45],		// [d,h] Medidas de la pierna (la altura incluye el pie)
						foot=[40,5]		// [long,h] Medidas del pie
						){
$fn=50;

// valores con límites: acotados entre un máximo y un mínimo (los valores límite están en <limits_oblobots.scad>)
d_leg=lim(d_leg_minmax[0],leg[0],d_leg_minmax[1]);			// medida de la pierna: diámetro
h_leg=lim(h_leg_minmax[0],leg[1],h_leg_minmax[1]);			// medida de la pierna: longitud

l_foot=lim(l_foot_minmax[0],foot[0],l_foot_minmax[1]);		// medida del pie: longitud	
h_foot=lim(h_foot_minmax[0],foot[1],h_foot_minmax[1]);		// medida del pie: altura (sin contar la altura de la base (heel))

// variables condicionadas a los valores de entrada
//legdtop=legd+1;					// medida de la pierna: grosor superior 
ankle=max(d_leg-5,7);				// medida de la pierna: grosor inferior

d_foot=ankle+6;				// medida del pie: ancho en el talón
d_pointfoot=d_foot*0.7;				// medida del pie: ancho en la punta

l_i_foot=l_foot-(d_pointfoot+d_foot)/2;

heel=3;							// talón, altura de la base

h_i_leg=h_leg-h_foot-heel;

// Volumen
rotate([0,0,90])
	union(){
		translate([0,0,heel+h_foot])
			// Canilla
			cylinder (r2=d_leg/2,r1=ankle/2,h=h_i_leg);
				// Pie				
				difference(){
					hull(){
						cylinder (r=d_foot/2,h=heel);
						translate([0,-l_i_foot,0])
							cylinder (r=d_pointfoot/2,h=2);
						translate([0,0,heel])
							cylinder(r=ankle/2,h=h_foot);
						}

					hull(){
						cylinder (r=(d_foot-4)/2,h=2,center=true);
						translate([0,-l_i_foot,0])
							cylinder (r=(d_pointfoot-4)/2,h=2,center=true);
						}
					}
		}
}
// -------------- Fin del módulo leg_cylindrical() ------------------------
// ------------------------------------------------------------------------


//////////////////////////////////////////////////////////////////
///////////// MÓDULO leg_quadrangle ();  ////////////////////

module leg_quadrangle (	leg=[10,15,8], 		// [ d, h, num de lados ] Medidas de la pierna (incluye el pie)
						foot	=[35,4]			// [ long, h ] Medidas dele pie
						){

// valores con límites: acotados entre un máximo y un mínimo (los valores límite están en <limits_oblobots.scad>)
d_leg=lim(d_leg_minmax[0],leg[0],d_leg_minmax[1]);		// medida de la pierna: diámetro
h_leg=lim(h_leg_minmax[0],leg[1],h_leg_minmax[1]);		// medida de la pierna: longitud
n_leg=lim(n_leg_minmax[0],leg[2],n_leg_minmax[1]);		// lim:(4<-->16) nº de lados de las piernas

l_foot=lim(l_foot_minmax[0],foot[0],l_foot_minmax[1]);	// medida del pie: longitud	
h_foot=lim(h_foot_minmax[0],foot[1],h_foot_minmax[1]);	// medida del pie: altura (sin contar la altura de la base (heel))

// variables condicionadas a los valores de entrada
//legdtop=legd+1;					// medida de la pierna: grosor superior 
ankle=max(d_leg-5,7);					// medida de la pierna: grosor inferior

w_foot=ankle+5;					// medida del pie: ancho en el talón
w_pointfoot=w_foot*0.7;				// medida del pie: ancho en la punta

l_i_foot=l_foot-(w_pointfoot+w_foot)/2;

heel=3;

h_i_leg=h_leg-h_foot-heel;

// Volumen
rotate([0,0,90])
	union(){
		// Canilla
		translate([0,0,heel+h_foot])
			pyramid_circumscribed (n=n_leg,d2=d_leg,d1=ankle,h=h_i_leg);	
				// Pie			
				difference(){
					hull(){
						translate([0,0,heel/2])
							cube([w_foot,w_foot,heel],center=true);
						translate([0,-l_i_foot,1])
							cube([w_pointfoot,w_pointfoot,2],center=true);
						translate([0,0,heel])
							prism_circumscribed(d=ankle,h=h_foot,n=n_leg);
						}
						hull(){
							cube([w_foot-4,w_foot-4,1.5],center=true);
							translate([0,-l_i_foot,0])								
								cube([w_pointfoot-4,w_pointfoot-4,1.5],center=true);
							}
						}
		}
}

// ------ Fin del módulo leg_quadrangle(leg=[d,h,n],foot=[l,h]) --------
// ----------------------------------------------------------------------




/////////////////////////////////////////////////////////////////////////
/////////////////// Ejemplos de aplicación //////////////////////////////



translate([20,0,0])
	rotate([0,0,90])
		leg_cylindrical(leg=[20,70],foot=[50,8]);

translate([-20,0,0])
	rotate([0,0,90])
		leg_quadrangle(leg=[25,55,4],foot=[45,9]);
